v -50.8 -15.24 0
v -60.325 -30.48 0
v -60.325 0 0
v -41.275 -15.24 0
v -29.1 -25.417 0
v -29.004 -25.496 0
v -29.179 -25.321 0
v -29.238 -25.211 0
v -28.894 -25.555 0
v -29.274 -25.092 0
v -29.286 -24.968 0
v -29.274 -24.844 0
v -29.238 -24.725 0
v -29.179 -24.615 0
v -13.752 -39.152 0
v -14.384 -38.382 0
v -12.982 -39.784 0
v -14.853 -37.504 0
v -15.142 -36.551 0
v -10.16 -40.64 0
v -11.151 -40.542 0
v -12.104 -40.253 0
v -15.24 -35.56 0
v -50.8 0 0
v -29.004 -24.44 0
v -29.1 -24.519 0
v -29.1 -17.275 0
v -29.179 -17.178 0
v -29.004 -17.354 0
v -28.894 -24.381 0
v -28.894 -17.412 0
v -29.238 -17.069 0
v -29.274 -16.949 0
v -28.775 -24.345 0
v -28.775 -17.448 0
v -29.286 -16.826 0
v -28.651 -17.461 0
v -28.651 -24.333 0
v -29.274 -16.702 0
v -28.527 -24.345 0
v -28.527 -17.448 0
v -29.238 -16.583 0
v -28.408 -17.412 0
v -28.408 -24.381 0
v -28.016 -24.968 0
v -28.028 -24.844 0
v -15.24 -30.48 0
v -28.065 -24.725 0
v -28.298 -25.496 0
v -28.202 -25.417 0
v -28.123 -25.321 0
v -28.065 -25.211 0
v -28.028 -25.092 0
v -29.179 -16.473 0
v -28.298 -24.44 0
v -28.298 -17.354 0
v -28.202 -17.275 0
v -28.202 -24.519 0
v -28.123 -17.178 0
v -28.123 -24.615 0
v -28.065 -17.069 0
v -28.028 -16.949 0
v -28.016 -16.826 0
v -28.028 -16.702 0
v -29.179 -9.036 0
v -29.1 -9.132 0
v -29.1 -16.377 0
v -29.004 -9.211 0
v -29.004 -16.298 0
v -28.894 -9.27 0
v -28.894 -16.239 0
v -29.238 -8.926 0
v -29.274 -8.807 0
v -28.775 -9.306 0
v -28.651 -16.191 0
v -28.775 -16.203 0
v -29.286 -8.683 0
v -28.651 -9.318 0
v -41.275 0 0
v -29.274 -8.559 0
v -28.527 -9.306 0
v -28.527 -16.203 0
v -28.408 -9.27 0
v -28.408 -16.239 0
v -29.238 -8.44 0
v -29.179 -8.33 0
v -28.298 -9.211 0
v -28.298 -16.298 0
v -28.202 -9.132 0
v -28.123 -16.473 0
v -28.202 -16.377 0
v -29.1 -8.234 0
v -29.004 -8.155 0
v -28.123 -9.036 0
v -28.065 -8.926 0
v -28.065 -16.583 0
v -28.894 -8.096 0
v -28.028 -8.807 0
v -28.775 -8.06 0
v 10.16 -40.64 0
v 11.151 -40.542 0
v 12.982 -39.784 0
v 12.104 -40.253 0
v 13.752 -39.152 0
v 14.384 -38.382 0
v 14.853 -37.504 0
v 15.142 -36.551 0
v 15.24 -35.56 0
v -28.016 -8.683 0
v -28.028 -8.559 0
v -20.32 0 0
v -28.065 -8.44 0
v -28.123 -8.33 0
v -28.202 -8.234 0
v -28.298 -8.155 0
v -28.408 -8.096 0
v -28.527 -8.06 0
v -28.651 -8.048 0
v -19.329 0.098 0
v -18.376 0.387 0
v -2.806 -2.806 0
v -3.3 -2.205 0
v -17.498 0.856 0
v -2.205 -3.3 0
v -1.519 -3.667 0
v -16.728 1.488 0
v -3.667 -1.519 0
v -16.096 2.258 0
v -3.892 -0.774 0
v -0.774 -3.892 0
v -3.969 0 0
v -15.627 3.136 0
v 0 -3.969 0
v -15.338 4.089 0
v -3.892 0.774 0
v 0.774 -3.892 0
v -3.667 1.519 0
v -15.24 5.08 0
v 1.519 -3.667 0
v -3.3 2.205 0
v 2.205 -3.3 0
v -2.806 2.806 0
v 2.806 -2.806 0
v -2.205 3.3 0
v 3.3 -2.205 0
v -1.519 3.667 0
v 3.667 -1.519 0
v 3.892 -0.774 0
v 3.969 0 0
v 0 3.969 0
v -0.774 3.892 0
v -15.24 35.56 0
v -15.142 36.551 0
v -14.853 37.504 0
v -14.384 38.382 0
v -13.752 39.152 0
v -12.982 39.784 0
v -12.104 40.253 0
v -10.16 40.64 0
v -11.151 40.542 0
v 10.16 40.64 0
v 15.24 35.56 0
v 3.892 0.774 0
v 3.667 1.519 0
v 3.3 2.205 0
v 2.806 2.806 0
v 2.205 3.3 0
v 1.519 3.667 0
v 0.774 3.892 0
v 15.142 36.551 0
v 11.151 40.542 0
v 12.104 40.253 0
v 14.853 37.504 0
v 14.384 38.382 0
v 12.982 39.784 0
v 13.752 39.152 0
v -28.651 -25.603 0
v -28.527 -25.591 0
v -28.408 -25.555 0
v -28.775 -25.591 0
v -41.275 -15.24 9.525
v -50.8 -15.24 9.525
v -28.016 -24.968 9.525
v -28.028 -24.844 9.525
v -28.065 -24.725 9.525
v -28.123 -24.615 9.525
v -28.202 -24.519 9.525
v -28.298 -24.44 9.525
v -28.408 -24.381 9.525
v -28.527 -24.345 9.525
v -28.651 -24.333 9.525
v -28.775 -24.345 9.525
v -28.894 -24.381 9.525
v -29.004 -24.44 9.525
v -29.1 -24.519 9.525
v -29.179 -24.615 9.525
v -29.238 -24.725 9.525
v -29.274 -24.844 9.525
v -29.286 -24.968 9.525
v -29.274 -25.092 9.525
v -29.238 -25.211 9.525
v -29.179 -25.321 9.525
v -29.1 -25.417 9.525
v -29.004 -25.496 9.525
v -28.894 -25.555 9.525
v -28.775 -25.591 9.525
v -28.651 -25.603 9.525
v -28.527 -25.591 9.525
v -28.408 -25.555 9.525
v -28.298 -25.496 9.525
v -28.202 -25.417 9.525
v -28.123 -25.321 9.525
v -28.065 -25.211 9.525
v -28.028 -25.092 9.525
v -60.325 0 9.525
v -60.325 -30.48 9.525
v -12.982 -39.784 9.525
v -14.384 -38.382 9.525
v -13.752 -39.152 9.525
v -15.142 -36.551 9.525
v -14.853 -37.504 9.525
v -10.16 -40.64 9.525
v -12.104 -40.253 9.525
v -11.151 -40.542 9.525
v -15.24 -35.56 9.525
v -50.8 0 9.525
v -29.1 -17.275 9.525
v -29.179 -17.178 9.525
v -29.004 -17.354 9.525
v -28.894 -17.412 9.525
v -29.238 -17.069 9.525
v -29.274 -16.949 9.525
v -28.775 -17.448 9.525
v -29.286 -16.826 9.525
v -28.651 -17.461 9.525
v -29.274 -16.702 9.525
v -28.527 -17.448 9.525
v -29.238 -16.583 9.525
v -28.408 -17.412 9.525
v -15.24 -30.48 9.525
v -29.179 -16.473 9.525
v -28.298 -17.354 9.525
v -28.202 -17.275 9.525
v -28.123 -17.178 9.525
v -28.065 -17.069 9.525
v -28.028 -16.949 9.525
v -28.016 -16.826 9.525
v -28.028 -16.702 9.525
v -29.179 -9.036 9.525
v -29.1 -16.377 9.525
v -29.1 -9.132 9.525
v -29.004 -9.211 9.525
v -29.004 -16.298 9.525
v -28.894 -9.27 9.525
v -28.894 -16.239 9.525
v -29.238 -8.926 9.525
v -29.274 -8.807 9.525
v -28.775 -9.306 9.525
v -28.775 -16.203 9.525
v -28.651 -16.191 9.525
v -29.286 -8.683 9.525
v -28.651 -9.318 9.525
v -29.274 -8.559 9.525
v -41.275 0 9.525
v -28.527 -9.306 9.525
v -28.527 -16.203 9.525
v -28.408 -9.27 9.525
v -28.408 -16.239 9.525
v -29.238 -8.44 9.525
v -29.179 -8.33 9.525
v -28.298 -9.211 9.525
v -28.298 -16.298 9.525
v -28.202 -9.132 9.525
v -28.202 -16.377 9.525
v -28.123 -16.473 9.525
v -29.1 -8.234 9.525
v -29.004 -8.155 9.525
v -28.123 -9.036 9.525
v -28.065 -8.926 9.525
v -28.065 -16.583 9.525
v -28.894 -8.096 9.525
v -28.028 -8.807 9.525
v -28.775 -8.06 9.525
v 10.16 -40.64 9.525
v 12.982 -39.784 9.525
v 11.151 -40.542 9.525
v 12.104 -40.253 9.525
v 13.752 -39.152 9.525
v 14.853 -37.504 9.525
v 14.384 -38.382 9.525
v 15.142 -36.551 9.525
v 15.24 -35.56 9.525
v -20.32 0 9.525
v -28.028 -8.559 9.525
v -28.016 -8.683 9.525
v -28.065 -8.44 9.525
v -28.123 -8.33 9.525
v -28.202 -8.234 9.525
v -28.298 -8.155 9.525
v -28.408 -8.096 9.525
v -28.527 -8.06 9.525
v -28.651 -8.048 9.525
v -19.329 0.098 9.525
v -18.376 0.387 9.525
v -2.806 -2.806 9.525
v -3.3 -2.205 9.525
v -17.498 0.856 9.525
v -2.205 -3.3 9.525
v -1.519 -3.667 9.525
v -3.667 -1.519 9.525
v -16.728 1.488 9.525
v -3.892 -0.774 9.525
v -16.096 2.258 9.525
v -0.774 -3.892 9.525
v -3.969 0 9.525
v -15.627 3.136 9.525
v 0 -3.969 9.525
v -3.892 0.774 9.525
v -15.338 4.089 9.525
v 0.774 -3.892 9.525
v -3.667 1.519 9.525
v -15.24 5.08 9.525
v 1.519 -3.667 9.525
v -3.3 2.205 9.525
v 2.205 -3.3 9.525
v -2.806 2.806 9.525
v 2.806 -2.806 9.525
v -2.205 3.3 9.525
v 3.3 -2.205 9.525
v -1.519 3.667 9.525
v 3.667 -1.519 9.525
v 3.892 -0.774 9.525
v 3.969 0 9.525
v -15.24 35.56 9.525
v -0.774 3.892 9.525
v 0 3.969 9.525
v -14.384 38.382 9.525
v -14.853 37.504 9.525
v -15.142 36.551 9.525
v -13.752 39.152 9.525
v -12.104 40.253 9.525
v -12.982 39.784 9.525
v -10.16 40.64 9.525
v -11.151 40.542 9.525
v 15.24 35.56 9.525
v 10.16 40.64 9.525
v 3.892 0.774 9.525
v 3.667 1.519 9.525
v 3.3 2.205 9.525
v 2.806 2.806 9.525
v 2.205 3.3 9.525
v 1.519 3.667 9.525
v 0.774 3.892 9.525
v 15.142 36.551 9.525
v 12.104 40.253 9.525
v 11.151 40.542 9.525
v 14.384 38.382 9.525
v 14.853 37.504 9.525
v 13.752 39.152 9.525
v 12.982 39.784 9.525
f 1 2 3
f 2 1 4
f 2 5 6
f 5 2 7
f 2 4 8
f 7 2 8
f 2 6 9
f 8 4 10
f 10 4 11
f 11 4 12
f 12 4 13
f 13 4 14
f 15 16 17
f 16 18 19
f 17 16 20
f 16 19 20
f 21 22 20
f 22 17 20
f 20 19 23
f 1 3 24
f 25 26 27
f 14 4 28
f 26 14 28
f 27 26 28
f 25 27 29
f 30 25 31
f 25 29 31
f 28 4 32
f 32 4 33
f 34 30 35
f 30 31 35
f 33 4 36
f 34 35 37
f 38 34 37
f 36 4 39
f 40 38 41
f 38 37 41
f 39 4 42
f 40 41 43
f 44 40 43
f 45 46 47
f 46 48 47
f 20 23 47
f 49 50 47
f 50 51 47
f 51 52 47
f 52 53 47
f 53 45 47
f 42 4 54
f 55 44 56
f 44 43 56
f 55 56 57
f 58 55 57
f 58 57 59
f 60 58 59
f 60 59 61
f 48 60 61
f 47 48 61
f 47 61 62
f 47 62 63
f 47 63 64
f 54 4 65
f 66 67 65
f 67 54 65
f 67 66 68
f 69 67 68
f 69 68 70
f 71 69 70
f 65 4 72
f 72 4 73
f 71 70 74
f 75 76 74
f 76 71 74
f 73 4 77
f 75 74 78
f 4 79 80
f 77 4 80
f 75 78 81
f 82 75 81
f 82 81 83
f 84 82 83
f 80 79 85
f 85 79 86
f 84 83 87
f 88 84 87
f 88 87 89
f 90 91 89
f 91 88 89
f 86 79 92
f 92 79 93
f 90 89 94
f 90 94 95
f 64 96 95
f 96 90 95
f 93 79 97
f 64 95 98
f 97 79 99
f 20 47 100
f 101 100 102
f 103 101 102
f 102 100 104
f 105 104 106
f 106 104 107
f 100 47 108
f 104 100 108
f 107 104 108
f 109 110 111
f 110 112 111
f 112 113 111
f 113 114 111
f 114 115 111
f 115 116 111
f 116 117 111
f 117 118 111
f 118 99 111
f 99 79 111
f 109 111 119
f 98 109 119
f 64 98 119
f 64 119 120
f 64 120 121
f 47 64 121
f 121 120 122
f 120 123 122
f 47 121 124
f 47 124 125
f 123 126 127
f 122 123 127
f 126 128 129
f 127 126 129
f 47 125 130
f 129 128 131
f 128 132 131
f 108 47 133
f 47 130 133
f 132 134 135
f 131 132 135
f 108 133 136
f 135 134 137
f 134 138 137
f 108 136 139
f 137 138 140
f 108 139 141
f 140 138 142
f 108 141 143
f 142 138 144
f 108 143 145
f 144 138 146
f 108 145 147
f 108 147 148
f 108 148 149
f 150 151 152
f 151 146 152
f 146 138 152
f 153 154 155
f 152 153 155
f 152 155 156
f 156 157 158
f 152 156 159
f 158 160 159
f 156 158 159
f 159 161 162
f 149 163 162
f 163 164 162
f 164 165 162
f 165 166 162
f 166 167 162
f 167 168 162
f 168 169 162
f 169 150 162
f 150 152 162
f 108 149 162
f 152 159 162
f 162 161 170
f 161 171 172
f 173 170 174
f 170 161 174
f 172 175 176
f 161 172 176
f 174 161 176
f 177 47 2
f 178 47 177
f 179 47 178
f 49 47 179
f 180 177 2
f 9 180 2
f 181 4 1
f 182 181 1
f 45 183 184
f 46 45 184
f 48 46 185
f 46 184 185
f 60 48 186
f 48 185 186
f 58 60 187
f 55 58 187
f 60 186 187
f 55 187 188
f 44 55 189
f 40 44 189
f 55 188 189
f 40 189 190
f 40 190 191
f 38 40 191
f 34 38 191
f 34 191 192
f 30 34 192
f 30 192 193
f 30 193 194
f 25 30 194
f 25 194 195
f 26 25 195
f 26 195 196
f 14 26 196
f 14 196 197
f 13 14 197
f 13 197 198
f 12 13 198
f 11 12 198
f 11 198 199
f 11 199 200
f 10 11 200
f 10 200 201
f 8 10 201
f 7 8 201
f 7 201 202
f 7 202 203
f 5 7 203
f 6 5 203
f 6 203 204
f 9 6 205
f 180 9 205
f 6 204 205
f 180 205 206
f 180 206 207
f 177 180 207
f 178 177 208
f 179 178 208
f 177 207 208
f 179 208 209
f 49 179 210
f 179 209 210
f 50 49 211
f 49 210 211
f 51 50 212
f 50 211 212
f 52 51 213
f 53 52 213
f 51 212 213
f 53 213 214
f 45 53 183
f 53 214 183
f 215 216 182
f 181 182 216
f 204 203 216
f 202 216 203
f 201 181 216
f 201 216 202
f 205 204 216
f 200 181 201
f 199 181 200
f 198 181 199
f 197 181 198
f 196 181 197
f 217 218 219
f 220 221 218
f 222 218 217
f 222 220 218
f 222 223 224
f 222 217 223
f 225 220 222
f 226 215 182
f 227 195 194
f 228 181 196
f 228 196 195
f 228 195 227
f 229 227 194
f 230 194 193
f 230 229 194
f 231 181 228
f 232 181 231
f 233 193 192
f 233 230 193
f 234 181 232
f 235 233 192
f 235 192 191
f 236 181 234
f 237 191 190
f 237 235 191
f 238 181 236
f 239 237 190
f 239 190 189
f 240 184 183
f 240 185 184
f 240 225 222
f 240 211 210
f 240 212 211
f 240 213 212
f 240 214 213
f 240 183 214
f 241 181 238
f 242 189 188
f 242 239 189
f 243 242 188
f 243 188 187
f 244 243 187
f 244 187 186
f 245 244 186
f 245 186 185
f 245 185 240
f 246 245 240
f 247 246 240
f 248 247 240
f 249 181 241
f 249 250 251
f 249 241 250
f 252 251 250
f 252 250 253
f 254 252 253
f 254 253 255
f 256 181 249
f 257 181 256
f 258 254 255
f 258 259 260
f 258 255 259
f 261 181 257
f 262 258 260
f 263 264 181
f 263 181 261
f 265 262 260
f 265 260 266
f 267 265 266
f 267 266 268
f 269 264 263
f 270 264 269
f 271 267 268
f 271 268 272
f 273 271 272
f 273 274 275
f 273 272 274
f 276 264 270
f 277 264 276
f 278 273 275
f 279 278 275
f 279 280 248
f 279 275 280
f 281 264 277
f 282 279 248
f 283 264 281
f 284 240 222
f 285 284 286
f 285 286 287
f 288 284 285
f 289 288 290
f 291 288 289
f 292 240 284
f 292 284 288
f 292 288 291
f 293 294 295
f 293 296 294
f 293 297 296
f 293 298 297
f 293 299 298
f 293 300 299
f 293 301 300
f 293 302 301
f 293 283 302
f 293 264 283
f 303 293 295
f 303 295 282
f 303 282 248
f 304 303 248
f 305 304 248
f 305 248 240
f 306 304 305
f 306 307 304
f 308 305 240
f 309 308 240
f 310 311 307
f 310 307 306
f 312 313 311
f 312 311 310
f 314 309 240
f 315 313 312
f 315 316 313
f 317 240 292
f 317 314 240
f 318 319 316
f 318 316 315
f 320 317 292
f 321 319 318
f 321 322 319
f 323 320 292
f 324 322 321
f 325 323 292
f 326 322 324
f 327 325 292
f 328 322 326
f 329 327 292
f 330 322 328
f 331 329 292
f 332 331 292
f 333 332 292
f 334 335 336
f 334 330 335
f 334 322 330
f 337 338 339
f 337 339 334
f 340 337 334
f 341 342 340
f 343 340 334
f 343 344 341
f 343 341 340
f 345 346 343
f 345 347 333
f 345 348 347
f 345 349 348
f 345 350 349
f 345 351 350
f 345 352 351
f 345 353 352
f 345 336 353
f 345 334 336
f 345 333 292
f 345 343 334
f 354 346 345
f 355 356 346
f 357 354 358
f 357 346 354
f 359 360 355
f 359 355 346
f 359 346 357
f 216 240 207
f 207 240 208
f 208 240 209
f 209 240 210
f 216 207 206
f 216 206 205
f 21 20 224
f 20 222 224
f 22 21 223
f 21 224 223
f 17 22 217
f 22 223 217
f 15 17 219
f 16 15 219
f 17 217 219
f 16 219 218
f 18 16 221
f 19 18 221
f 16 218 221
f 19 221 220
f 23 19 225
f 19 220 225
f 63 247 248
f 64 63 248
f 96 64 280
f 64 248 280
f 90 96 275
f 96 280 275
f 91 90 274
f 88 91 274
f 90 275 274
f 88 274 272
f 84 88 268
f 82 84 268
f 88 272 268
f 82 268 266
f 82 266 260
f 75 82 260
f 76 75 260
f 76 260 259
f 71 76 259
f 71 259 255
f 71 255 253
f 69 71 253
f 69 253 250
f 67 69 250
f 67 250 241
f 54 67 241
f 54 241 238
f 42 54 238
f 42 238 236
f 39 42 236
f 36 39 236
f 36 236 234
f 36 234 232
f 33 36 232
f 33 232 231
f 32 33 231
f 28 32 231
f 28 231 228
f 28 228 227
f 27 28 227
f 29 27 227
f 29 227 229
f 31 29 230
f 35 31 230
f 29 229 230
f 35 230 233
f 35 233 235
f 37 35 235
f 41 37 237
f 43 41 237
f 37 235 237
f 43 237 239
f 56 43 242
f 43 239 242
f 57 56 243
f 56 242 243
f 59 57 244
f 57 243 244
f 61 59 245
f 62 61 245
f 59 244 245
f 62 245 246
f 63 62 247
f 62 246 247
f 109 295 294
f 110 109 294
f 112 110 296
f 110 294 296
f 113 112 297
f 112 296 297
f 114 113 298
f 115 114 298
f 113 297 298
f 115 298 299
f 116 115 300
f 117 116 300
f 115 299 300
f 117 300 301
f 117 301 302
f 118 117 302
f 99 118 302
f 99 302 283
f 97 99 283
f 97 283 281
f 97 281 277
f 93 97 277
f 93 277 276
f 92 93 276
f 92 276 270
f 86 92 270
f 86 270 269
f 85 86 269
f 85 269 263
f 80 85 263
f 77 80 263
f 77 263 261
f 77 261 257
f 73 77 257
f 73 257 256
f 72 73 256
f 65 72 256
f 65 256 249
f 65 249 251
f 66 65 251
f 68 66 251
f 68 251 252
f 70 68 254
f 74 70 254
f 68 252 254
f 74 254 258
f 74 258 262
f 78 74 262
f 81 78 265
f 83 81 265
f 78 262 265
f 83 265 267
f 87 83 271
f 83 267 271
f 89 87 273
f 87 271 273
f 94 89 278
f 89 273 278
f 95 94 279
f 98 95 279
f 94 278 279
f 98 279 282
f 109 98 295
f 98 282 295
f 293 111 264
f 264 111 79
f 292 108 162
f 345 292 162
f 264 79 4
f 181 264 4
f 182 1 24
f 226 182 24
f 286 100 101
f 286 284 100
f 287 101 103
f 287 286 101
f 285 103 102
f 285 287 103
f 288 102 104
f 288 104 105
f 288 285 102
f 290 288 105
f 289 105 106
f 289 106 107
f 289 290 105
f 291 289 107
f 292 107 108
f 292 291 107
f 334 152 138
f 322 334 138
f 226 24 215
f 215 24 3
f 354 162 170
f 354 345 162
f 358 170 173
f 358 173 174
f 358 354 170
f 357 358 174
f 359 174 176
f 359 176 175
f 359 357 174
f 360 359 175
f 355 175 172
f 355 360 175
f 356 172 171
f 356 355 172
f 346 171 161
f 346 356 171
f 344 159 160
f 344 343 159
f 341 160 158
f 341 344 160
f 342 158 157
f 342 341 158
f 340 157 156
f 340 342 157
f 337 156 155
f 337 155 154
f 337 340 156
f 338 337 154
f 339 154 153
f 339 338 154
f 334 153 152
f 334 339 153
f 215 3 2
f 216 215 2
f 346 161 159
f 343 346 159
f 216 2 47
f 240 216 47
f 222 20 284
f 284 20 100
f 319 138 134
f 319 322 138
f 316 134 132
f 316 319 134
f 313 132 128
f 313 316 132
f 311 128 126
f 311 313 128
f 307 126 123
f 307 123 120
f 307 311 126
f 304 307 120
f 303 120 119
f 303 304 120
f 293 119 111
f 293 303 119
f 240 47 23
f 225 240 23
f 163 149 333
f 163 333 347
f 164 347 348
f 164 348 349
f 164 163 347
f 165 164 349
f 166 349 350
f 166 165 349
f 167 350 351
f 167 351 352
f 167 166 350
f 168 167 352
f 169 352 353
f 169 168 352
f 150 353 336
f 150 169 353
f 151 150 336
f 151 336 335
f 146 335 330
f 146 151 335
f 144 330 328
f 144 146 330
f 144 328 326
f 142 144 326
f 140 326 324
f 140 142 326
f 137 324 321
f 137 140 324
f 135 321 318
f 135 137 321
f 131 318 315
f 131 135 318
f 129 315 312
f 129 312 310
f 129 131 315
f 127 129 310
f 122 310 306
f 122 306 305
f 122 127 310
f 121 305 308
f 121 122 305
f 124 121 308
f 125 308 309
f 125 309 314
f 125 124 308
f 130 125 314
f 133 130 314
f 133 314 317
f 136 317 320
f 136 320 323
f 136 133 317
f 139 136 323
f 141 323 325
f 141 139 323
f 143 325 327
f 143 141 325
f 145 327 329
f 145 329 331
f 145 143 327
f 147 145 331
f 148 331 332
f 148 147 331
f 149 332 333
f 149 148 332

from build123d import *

# Parameters (mm, degrees)
SKETCH1_R           = 3.96875
BOSS_EXTRUDE1_DEPTH = 9.525
FILLET2_R           = 5.08
CUT_EXTRUDE1_REACH  = 11.525
SKETCH2_R           = 0.635


with BuildPart() as part:
    # Sketch1 → Boss-Extrude1 (new body)
    with BuildSketch(Plane.XY):
        Polygon((-15.24, -40.64), (15.24, -40.64), (15.24, 40.64), (-15.24, 40.64), (-15.24, 0), (-41.275, 0), (-41.275, -15.24), (-50.8, -15.24), (-50.8, 0), (-60.325, 0), (-60.325, -30.48), (-15.24, -30.48), align=None)
        Circle(SKETCH1_R, mode=Mode.SUBTRACT)
    extrude(amount=BOSS_EXTRUDE1_DEPTH)

    # Fillet2
    fillet2_edges = [part.edges().sort_by_distance(p)[0] for p in [
        (-15.24, 0, 4.7625),
        (-15.24, 40.64, 4.7625),
        (15.24, 40.64, 4.7625),
        (15.24, -40.64, 4.7625),
        (-15.24, -40.64, 4.7625),
    ]]
    fillet(fillet2_edges, radius=FILLET2_R)

    # Sketch2 → Cut-Extrude1 (cut, up to next)
    with BuildSketch(Plane.XY.offset(9.525), mode=Mode.PRIVATE) as cut_extrude1_sk1:
        with Locations((-28.6512, -8.683)):
            Circle(SKETCH2_R)
    cut_extrude1_tool1 = extrude(cut_extrude1_sk1.sketch, amount=-CUT_EXTRUDE1_REACH, mode=Mode.PRIVATE) & part.part
    add(cut_extrude1_tool1.solids().sort_by_distance((-28.6512, -8.683, 9.525))[0], mode=Mode.SUBTRACT)
    # Sketch2 → Cut-Extrude1 (cut, up to next)
    with BuildSketch(Plane.XY.offset(9.525), mode=Mode.PRIVATE) as cut_extrude1_sk2:
        with Locations((-28.6512, -16.825545611)):
            Circle(SKETCH2_R)
    cut_extrude1_tool2 = extrude(cut_extrude1_sk2.sketch, amount=-CUT_EXTRUDE1_REACH, mode=Mode.PRIVATE) & part.part
    add(cut_extrude1_tool2.solids().sort_by_distance((-28.6512, -16.825546, 9.525))[0], mode=Mode.SUBTRACT)
    # Sketch2 → Cut-Extrude1 (cut, up to next)
    with BuildSketch(Plane.XY.offset(9.525), mode=Mode.PRIVATE) as cut_extrude1_sk3:
        with Locations((-28.6512, -24.968091222)):
            Circle(SKETCH2_R)
    cut_extrude1_tool3 = extrude(cut_extrude1_sk3.sketch, amount=-CUT_EXTRUDE1_REACH, mode=Mode.PRIVATE) & part.part
    add(cut_extrude1_tool3.solids().sort_by_distance((-28.6512, -24.968091, 9.525))[0], mode=Mode.SUBTRACT)


solid = part.part
